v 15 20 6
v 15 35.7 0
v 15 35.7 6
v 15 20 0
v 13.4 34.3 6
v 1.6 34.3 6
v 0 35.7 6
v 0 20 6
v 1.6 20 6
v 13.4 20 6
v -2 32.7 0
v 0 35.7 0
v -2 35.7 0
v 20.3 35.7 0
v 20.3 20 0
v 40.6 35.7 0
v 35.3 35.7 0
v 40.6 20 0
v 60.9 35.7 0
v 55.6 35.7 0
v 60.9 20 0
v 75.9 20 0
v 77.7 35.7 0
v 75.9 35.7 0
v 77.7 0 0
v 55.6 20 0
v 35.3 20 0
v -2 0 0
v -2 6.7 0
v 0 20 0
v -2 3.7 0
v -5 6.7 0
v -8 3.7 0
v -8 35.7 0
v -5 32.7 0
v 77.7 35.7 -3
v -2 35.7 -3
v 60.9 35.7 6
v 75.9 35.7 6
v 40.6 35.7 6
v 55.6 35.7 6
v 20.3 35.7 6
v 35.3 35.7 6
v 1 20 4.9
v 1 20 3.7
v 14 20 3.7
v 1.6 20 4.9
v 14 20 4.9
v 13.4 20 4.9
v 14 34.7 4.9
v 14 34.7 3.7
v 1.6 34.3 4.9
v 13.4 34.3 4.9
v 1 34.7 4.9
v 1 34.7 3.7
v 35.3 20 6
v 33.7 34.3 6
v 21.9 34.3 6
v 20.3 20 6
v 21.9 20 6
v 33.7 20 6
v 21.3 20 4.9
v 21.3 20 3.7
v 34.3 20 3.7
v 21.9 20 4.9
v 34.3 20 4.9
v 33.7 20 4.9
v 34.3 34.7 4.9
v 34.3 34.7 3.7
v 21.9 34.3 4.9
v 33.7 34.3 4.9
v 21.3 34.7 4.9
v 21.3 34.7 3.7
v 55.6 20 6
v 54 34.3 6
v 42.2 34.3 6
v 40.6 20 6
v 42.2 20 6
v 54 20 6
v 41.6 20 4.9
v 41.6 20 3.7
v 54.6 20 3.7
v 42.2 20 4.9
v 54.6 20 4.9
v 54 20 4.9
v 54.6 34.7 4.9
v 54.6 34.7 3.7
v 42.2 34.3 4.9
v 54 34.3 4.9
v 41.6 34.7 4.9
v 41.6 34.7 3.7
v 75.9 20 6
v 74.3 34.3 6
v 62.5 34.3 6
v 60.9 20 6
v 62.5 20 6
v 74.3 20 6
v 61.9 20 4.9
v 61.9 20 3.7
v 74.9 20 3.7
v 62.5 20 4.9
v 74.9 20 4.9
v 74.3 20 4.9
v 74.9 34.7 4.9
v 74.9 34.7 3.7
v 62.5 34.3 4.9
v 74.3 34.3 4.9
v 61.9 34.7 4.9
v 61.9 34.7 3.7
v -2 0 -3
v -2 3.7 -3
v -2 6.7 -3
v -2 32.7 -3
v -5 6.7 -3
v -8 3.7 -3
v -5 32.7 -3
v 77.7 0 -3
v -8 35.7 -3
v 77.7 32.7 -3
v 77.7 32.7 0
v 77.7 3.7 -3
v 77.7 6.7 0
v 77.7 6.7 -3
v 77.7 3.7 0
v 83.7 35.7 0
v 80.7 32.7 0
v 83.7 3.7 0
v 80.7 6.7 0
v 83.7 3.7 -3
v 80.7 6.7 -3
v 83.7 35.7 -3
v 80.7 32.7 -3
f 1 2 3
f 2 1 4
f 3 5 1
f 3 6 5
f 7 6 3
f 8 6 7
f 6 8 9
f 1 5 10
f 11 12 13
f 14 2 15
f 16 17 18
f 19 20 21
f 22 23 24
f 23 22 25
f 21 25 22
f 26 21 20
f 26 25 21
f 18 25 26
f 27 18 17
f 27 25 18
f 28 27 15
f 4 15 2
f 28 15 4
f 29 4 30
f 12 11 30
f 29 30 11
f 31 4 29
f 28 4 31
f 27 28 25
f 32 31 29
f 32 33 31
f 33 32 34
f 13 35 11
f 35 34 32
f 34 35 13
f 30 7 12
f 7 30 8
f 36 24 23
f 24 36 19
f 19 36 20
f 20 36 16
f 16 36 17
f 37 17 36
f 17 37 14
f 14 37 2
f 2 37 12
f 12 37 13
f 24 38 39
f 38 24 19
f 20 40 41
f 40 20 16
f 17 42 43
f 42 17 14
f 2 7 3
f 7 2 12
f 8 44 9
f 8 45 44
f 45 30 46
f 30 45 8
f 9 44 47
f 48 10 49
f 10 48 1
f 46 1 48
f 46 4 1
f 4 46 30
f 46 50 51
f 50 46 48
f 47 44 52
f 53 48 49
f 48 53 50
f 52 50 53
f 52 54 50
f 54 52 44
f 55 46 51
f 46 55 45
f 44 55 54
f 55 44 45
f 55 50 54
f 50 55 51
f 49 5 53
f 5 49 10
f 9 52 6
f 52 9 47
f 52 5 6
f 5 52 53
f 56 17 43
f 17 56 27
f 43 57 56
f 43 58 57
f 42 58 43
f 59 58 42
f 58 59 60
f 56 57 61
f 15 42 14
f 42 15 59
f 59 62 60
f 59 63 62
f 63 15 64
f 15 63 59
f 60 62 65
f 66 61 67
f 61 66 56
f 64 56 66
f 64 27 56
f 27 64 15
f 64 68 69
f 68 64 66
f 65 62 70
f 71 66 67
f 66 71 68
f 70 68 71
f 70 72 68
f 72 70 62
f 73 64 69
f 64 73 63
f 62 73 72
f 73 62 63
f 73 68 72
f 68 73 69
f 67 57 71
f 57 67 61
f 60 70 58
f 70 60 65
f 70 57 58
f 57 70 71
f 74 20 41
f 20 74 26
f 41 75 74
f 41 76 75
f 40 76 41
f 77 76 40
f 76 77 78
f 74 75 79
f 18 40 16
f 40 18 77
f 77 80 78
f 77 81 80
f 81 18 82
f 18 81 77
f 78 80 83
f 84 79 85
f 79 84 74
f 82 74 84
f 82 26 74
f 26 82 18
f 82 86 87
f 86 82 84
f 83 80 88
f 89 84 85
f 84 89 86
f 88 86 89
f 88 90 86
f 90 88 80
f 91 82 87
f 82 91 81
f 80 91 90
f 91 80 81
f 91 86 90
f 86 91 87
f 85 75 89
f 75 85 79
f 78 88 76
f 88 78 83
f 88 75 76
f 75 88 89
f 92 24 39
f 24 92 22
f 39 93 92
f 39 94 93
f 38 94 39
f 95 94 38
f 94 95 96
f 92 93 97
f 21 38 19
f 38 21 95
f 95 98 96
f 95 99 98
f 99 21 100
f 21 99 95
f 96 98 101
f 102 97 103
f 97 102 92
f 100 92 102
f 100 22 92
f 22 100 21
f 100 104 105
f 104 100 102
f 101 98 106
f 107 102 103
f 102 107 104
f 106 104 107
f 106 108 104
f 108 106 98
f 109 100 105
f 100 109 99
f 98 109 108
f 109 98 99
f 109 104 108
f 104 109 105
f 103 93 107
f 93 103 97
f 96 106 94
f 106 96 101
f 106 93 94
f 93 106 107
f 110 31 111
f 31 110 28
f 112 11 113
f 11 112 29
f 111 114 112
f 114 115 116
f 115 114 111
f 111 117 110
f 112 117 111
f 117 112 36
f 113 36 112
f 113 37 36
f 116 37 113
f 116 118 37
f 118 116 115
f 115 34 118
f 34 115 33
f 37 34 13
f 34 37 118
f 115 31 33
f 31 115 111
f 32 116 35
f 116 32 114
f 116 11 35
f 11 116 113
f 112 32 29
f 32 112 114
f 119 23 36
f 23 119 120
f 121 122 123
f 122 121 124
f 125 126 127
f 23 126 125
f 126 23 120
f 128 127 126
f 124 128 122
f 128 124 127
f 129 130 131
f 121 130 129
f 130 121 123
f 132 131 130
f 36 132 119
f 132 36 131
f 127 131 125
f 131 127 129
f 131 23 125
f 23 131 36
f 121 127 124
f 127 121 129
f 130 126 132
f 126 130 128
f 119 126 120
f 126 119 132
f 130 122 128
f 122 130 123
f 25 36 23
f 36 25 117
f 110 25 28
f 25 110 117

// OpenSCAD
module sensorSlot(){
	difference(){
		cube([15.0,15.7,6.0],false);		//outer cube
		translate([1,0,3.7])					//inner cube
			//cube([12.9,14.7,1.2],false);		
			cube([13.0,14.7,1.2],false);		
		translate([1.6,0,4.8])				//upper cube
			cube([11.8,14.3,1.3]);		
		
	}
}

distY = 20;
distX = 20.3;

//the four sensor slots
translate([0,distY,0])
	sensorSlot();
translate([distX,distY,0])
	sensorSlot();
translate([2*distX,distY,0])
		sensorSlot();
translate([3*distX,distY,0])
		sensorSlot();

//the "ground plate"
groundHeigth = 3;
translate([-2,0,-groundHeigth])
		color("blue") cube([79.7,35.7,groundHeigth]);

//for the strap
translate([-8,3.7,-groundHeigth])
	difference(){
		cube([6,32,groundHeigth]);
		translate([3,3,0])
			cube([3,26,groundHeigth]);
}

translate([83.7,3.7,-groundHeigth])
	mirror(){
	difference(){
		cube([6,32,groundHeigth]);
		translate([3,3,0])
			cube([3,26,groundHeigth]);
}
}
